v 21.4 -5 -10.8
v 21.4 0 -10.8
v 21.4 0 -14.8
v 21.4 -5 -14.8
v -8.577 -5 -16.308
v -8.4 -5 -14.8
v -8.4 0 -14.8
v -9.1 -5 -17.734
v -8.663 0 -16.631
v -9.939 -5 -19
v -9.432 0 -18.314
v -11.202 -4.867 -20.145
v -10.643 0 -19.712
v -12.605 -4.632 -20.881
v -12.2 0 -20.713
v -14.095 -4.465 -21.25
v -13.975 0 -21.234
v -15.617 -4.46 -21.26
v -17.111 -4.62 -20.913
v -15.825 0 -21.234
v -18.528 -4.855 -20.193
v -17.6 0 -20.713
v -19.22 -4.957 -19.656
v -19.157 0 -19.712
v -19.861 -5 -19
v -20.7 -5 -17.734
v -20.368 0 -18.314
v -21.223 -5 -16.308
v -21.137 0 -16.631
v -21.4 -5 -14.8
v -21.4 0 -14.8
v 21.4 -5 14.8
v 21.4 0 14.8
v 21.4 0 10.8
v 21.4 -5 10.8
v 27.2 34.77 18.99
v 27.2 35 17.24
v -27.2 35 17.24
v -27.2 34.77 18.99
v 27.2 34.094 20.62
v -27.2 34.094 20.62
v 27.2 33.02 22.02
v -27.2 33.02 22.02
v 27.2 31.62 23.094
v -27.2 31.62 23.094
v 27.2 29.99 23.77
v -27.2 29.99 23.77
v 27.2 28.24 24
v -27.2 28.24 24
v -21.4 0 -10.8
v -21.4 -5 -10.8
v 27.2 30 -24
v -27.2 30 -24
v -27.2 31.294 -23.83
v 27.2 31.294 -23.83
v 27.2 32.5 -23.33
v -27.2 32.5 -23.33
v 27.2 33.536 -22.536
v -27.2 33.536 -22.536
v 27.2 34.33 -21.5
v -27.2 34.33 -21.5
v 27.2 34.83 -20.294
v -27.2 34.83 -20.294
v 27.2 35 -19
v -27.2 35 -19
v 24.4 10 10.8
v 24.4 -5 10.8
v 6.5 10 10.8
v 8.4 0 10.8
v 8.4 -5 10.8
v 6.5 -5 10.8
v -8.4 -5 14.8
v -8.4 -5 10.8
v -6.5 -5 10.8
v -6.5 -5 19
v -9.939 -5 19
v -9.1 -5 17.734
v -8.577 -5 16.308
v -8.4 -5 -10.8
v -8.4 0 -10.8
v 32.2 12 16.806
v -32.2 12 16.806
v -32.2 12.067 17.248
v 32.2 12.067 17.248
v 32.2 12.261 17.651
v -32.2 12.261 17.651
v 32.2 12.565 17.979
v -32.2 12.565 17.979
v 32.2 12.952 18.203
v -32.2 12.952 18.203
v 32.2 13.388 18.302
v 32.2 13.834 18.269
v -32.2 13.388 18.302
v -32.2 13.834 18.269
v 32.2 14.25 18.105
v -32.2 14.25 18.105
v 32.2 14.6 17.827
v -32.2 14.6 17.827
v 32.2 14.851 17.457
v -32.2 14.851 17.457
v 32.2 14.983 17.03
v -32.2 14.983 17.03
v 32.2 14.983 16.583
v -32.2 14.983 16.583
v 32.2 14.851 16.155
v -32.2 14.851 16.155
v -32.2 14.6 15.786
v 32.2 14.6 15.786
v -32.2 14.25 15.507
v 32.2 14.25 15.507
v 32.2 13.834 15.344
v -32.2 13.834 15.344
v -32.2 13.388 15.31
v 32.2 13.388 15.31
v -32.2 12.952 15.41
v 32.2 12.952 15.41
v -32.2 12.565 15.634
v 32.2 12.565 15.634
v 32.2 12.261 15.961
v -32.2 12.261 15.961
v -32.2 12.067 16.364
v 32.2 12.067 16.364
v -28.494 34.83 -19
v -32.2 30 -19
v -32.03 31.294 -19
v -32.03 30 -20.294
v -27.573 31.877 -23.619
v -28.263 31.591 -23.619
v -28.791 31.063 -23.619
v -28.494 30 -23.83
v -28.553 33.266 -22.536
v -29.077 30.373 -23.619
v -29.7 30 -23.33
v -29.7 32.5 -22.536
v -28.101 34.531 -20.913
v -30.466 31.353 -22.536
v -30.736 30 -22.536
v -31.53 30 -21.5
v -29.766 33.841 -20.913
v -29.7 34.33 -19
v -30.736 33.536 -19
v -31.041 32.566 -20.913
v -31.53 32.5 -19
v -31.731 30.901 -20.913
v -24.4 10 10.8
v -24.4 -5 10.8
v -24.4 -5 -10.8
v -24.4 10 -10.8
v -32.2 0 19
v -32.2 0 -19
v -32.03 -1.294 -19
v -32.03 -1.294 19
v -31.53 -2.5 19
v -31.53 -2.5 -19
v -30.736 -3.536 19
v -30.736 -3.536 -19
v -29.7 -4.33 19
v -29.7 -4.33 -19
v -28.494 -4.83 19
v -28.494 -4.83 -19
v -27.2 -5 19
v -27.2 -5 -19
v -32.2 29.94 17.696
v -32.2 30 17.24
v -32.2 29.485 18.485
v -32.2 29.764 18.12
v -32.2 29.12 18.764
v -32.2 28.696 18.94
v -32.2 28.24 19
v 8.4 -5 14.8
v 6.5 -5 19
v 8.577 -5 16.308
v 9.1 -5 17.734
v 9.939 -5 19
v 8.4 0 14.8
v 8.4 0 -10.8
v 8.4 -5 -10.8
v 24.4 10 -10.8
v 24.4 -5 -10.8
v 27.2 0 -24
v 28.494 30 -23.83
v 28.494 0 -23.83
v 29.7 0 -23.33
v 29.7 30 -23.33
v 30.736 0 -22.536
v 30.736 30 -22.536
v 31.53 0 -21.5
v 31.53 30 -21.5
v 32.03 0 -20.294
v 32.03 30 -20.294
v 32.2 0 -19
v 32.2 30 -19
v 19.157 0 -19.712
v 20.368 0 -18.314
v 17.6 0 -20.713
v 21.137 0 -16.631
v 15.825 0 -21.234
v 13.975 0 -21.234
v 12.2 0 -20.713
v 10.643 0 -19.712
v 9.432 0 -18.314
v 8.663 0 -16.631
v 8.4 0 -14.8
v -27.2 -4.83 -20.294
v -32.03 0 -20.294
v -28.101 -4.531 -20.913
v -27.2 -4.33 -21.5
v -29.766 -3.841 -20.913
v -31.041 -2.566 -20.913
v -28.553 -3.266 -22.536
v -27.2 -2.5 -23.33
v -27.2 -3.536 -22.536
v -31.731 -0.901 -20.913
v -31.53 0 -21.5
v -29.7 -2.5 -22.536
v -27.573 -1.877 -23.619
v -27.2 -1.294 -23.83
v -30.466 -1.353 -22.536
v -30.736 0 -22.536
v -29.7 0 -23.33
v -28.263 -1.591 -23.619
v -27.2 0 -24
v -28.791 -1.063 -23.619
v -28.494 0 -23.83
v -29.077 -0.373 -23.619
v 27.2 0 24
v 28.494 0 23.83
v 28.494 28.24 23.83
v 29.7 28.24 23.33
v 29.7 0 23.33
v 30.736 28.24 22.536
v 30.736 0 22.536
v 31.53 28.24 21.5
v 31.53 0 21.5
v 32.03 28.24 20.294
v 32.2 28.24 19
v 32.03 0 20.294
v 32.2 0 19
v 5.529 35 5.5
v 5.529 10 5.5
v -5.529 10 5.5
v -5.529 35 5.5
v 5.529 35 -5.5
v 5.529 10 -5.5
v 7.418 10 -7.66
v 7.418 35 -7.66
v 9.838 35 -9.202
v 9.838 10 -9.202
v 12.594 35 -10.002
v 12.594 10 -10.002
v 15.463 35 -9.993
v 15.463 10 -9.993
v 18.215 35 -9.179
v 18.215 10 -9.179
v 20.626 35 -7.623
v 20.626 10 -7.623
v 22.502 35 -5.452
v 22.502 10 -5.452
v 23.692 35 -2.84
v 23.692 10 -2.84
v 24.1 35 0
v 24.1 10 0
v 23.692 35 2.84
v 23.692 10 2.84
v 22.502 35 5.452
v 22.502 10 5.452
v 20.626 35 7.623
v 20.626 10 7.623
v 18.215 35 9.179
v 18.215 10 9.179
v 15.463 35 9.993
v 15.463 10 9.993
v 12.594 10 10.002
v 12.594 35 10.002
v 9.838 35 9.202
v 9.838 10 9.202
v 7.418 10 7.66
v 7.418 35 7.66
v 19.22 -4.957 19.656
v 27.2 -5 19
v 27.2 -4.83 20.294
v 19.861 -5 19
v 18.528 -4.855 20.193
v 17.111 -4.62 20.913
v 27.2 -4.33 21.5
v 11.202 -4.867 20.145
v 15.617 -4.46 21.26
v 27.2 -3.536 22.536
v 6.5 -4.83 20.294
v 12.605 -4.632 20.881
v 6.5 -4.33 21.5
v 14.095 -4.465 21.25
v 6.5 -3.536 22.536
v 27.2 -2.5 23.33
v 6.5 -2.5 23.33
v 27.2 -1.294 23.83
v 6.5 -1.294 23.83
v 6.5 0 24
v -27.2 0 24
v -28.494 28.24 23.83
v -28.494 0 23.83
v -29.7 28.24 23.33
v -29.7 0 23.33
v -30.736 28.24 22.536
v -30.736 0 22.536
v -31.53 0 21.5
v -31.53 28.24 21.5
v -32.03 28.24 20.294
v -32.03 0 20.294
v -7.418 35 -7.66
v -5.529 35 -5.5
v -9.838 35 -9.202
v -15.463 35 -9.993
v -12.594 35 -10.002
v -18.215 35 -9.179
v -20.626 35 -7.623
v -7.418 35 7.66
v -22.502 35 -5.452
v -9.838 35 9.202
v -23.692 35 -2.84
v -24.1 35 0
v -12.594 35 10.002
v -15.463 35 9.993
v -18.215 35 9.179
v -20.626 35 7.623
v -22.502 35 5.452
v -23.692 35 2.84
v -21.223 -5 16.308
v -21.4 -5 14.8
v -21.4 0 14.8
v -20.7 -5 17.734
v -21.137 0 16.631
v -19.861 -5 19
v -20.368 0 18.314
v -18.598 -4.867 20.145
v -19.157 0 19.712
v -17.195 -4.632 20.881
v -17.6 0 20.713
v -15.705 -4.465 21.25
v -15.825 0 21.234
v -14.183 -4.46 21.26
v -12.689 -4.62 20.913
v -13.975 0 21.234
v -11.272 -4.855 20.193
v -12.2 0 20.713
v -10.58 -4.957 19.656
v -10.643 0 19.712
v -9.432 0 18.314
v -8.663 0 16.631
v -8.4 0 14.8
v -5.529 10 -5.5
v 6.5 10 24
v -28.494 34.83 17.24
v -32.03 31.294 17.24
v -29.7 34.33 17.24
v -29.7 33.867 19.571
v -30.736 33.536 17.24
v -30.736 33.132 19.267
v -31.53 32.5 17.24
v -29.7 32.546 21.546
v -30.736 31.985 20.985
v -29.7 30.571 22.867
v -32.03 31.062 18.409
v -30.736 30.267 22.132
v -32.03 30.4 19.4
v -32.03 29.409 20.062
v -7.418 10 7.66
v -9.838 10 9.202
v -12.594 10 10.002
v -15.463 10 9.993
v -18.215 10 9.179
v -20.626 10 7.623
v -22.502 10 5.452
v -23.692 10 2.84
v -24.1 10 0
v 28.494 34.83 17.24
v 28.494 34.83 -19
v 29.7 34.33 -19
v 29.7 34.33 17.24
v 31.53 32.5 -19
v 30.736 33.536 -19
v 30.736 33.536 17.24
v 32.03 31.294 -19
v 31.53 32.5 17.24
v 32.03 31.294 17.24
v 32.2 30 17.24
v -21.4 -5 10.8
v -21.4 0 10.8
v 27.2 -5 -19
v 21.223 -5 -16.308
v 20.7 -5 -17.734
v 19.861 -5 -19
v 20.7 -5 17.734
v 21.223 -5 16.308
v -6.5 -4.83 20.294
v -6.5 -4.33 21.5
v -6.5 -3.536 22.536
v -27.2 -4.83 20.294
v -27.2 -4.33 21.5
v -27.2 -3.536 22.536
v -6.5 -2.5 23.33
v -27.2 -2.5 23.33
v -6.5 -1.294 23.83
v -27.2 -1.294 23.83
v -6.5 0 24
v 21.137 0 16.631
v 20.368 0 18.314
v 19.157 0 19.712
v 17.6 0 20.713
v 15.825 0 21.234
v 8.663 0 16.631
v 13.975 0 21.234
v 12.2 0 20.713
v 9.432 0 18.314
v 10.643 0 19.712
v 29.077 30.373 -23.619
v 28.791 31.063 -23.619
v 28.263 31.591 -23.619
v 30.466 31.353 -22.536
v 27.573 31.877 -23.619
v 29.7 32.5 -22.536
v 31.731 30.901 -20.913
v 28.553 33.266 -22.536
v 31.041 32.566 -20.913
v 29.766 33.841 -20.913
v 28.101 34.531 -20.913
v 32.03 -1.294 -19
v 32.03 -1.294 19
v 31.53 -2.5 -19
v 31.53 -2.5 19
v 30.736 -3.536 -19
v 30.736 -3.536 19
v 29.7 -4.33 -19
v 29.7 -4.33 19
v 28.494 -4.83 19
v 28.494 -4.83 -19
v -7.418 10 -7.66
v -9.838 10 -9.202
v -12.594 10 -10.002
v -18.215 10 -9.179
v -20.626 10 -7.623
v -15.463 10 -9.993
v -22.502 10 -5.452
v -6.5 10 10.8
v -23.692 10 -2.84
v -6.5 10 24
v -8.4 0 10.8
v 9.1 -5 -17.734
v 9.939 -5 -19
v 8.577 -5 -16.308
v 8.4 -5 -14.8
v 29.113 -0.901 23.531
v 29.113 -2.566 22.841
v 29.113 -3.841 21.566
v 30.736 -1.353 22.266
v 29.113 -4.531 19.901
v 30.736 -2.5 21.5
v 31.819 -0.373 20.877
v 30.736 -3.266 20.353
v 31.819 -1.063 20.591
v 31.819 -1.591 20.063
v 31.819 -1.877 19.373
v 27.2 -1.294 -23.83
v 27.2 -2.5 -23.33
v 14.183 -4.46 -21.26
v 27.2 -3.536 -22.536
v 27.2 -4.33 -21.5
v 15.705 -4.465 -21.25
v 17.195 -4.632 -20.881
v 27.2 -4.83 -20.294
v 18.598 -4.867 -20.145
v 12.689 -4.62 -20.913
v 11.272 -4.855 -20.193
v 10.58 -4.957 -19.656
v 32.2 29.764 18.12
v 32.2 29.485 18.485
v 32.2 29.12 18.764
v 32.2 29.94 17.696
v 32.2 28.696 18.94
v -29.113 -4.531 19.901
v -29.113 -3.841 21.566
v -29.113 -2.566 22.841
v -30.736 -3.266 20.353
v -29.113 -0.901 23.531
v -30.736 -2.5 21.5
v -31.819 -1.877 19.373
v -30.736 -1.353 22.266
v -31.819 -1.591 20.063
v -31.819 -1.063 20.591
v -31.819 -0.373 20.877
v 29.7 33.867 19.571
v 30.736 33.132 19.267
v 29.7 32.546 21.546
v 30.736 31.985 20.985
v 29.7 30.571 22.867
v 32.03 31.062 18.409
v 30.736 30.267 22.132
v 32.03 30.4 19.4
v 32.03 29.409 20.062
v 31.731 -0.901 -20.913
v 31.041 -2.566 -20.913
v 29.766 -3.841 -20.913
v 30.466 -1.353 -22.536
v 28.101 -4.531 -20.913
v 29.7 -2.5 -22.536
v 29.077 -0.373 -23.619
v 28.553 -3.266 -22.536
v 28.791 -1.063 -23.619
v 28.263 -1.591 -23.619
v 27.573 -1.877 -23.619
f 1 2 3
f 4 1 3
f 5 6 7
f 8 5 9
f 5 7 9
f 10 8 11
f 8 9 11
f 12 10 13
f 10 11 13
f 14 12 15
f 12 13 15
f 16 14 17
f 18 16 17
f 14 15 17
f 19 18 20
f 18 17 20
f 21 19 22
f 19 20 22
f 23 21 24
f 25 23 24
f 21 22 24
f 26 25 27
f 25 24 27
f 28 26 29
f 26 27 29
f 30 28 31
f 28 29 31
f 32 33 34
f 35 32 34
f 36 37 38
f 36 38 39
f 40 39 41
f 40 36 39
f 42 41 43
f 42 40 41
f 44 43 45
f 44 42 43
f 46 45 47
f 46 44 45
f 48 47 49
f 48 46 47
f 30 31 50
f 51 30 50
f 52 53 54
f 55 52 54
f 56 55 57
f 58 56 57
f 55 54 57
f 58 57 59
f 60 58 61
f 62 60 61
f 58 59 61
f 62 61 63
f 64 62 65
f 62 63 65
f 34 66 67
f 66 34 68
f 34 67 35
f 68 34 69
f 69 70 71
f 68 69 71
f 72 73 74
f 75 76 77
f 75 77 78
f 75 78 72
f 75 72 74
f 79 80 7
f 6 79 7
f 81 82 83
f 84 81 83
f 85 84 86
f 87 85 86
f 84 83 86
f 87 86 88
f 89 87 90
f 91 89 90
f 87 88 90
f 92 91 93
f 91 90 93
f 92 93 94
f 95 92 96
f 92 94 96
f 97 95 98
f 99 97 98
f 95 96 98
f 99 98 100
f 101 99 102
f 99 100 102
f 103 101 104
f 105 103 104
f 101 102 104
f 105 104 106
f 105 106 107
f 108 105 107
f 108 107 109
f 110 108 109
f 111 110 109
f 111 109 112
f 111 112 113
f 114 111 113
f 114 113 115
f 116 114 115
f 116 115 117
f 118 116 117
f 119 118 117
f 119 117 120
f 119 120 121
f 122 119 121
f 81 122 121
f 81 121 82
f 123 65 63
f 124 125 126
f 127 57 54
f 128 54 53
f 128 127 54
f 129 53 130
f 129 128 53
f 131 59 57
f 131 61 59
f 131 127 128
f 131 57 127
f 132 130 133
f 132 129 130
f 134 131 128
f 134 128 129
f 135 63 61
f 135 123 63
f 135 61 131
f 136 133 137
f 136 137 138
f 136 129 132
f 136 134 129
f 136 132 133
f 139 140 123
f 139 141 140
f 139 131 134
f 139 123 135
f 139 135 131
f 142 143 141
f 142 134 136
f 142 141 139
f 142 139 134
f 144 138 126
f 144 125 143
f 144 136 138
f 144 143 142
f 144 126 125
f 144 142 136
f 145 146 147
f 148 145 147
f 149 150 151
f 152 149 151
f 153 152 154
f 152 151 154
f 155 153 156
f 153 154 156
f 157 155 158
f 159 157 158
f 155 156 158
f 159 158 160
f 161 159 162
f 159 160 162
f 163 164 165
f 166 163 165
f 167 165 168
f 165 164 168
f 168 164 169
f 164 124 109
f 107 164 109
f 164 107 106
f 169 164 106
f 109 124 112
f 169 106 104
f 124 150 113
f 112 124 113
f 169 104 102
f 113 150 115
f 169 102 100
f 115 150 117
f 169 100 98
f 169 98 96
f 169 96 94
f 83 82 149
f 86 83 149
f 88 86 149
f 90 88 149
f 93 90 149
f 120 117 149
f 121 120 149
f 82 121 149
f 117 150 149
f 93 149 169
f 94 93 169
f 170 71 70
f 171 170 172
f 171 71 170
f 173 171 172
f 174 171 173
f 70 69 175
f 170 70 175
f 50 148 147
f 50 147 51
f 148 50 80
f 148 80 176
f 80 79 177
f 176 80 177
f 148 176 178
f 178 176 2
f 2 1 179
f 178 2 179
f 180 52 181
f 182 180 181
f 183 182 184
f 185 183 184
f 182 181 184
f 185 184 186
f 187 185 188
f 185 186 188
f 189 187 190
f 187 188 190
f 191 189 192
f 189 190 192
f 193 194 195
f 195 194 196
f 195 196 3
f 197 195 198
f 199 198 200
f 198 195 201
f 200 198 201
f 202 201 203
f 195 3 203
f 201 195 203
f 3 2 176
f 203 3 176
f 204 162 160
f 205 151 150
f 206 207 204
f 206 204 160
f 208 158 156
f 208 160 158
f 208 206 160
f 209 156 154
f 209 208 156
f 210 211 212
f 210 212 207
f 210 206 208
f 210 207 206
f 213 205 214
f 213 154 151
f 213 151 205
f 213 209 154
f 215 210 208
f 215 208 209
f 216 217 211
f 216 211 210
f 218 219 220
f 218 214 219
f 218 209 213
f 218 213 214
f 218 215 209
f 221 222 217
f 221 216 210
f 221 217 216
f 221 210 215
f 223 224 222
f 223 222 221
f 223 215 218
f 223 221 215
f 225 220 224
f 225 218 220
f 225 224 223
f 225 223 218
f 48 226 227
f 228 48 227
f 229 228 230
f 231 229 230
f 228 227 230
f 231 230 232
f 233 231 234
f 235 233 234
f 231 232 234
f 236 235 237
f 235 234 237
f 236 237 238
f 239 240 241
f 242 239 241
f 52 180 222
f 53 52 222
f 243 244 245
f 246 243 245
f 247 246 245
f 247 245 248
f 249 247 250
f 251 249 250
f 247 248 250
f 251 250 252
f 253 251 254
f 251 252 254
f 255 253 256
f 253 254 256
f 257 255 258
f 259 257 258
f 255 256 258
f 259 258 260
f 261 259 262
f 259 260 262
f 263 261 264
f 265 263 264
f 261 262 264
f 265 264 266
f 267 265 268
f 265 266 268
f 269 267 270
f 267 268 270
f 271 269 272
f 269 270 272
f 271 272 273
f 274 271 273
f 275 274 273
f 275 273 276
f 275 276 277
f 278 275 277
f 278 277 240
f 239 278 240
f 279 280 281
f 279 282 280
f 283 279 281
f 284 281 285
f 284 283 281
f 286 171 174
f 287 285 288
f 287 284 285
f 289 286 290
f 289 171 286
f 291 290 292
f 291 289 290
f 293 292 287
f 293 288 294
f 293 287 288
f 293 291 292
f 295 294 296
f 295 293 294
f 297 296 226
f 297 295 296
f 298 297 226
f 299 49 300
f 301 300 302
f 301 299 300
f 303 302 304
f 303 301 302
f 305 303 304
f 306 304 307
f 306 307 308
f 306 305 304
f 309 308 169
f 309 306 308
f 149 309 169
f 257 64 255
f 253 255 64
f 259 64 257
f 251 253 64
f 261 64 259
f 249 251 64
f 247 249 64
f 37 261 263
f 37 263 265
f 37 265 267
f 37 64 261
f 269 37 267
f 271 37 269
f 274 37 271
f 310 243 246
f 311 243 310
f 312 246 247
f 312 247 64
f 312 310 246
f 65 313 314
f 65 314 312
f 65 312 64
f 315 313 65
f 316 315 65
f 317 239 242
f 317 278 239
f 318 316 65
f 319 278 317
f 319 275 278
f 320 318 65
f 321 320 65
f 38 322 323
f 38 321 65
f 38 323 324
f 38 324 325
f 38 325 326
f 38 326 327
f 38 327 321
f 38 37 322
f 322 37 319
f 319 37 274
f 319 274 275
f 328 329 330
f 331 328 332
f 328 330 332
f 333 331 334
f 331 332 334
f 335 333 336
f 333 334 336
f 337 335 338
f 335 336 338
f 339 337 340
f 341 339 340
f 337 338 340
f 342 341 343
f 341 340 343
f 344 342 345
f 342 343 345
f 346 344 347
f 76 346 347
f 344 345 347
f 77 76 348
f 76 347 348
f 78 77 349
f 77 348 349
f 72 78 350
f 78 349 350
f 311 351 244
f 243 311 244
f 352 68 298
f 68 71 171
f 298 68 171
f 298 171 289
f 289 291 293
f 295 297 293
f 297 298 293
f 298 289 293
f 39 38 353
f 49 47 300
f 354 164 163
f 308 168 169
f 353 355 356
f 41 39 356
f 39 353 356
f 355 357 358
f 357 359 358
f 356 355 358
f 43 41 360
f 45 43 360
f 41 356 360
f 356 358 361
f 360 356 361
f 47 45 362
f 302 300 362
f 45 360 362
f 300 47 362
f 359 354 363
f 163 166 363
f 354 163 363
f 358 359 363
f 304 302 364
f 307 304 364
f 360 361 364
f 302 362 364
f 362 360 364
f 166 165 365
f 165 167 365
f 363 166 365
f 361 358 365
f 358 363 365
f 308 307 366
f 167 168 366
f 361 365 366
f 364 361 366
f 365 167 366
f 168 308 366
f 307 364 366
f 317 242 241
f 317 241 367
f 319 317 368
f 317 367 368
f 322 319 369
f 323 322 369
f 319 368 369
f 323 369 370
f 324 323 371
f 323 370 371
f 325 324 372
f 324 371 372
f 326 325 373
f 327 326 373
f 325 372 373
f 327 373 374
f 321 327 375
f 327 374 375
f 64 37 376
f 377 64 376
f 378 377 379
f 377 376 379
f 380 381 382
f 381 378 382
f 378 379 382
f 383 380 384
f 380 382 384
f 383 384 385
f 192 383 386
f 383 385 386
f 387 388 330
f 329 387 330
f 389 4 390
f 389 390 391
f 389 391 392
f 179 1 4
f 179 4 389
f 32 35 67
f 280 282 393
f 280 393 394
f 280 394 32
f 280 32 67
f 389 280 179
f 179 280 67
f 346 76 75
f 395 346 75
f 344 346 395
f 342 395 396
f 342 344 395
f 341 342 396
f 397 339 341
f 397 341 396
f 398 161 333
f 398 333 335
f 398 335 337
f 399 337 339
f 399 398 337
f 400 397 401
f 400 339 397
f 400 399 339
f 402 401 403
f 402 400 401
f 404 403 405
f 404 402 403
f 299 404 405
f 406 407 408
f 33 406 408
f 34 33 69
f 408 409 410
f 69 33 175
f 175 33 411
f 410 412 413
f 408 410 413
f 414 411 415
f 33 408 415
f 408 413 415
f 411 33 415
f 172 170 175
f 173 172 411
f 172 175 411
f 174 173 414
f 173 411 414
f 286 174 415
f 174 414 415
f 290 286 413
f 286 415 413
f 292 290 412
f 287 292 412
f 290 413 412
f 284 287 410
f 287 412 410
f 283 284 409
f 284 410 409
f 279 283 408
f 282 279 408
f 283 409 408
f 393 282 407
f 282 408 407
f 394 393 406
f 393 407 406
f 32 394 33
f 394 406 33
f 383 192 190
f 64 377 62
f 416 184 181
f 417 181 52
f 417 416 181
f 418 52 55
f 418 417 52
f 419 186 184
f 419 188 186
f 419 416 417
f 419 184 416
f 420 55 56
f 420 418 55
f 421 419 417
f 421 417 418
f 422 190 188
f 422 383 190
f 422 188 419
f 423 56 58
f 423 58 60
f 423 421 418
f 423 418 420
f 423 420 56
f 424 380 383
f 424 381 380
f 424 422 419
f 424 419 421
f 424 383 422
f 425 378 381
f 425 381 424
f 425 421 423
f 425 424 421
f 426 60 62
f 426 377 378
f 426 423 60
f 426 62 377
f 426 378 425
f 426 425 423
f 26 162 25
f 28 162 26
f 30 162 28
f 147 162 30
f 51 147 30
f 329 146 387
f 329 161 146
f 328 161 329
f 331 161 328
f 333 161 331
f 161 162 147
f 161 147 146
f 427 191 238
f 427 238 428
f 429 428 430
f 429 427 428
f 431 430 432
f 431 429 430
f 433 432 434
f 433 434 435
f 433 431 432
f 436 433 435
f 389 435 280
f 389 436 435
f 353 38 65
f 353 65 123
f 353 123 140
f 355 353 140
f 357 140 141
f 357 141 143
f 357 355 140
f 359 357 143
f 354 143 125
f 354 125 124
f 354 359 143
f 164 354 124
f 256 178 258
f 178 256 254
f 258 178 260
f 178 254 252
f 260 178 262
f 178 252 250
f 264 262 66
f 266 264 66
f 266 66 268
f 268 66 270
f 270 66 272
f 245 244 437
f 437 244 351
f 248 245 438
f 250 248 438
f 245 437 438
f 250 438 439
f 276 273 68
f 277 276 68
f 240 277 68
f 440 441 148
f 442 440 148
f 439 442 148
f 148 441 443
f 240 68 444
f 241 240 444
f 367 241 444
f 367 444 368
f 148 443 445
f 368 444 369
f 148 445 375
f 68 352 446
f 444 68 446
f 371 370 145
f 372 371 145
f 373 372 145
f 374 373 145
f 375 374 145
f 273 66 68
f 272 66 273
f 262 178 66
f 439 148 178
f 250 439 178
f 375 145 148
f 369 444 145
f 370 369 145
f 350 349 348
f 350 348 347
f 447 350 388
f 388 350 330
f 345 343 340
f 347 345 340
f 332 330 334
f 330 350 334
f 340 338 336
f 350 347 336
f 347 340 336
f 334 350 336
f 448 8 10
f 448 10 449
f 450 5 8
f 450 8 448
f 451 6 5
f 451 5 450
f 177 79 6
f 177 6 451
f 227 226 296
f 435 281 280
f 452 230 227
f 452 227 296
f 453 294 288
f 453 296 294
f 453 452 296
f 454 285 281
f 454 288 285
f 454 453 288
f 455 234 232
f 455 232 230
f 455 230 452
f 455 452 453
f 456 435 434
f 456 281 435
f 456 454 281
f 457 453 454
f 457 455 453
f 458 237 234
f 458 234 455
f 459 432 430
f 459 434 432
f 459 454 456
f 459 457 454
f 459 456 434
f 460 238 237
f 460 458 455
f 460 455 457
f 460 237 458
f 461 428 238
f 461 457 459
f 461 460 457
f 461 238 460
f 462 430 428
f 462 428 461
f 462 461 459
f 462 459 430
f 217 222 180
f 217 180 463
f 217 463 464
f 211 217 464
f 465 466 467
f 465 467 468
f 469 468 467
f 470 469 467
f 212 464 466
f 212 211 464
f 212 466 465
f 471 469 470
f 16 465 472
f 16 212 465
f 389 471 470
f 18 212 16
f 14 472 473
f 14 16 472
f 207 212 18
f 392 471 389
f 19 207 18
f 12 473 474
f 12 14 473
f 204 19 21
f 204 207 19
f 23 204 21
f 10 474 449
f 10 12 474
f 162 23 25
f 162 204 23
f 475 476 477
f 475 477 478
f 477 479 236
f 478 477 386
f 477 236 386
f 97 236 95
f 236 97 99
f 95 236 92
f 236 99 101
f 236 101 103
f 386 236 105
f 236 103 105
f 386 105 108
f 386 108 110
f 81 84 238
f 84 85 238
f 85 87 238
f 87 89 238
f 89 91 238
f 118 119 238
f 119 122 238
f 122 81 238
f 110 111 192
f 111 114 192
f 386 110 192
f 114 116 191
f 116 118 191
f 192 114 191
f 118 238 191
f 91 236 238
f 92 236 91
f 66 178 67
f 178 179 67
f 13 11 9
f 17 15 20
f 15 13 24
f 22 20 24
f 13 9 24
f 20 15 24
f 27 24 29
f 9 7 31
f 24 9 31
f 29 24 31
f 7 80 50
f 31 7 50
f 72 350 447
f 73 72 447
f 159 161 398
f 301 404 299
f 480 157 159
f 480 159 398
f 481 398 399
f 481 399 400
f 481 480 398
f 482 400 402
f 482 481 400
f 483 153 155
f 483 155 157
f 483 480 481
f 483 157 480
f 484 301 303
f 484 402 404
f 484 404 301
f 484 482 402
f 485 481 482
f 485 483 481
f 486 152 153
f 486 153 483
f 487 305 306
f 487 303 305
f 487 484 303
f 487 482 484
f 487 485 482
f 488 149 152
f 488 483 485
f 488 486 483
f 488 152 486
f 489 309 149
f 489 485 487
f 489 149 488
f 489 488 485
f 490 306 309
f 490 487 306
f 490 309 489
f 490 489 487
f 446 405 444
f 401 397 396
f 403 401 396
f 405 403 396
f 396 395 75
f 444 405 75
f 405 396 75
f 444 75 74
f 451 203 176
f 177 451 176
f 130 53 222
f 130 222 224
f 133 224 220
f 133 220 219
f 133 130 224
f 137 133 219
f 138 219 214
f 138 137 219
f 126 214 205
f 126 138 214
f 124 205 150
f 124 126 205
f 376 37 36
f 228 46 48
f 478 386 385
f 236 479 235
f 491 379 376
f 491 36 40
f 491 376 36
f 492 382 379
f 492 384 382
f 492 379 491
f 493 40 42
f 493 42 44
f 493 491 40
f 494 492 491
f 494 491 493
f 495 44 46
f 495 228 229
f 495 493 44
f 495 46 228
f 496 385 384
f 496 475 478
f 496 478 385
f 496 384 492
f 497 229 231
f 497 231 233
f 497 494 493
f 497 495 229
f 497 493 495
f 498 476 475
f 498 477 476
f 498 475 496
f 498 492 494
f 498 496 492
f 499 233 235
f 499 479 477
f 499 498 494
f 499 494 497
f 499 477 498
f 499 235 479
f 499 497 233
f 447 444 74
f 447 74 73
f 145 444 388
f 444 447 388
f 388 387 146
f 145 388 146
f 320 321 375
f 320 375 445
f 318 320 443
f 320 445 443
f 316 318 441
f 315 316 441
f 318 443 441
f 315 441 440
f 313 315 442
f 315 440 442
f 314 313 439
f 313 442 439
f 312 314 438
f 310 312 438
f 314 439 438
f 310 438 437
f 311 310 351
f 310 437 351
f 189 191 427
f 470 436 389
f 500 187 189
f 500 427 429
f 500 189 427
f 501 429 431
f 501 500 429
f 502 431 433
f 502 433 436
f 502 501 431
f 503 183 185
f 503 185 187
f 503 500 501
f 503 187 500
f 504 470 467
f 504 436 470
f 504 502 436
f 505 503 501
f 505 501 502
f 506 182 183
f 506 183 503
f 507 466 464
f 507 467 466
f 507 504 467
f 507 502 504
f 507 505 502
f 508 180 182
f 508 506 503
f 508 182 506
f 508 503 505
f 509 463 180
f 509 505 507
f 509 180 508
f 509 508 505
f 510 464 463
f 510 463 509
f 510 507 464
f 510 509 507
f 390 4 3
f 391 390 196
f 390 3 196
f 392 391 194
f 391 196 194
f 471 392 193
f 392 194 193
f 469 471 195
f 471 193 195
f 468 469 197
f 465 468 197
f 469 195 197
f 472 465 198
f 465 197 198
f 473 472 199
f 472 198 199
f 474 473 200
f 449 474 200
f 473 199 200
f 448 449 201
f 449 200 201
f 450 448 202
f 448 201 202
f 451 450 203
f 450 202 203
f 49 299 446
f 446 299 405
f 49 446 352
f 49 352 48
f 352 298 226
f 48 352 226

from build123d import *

# Parameters (mm, degrees)
F1_DEPTH      = 5
F3_DEPTH      = 10
F5_DEPTH      = 25
F6_R          = 1.5
F7_DEPTH      = 69.4
F8_R          = 6.7597979746
F9_R          = 5
F10_R         = 5
F11_T1_DEPTH  = 45.7
F11_T3_DEPTH  = 45.7
F12_T1_DEPTH  = 54.4
F12_T3_DEPTH  = 30
F12_T5_DEPTH  = 38
F12_S9_W      = 5
F12_S9_H      = 5
F12_T10_DEPTH = 5
F12_S15_W     = 5
F12_S15_H     = 5
F12_T16_DEPTH = 5
F12_S21_W     = 5
F12_S21_H     = 5
F12_T22_DEPTH = 5
F12_S27_W     = 5
F12_S27_H     = 5
F12_T28_DEPTH = 5
F12_T32_ANGLE = 90
F12_T34_ANGLE = 90


# Not quite as in the source:
# - a fillet or chamfer that OpenCascade refuses, or shapes differently, is made with other operations: its cross-section is extruded or revolved along the edge and cut away or added


with BuildPart() as f1:
    # F0 (on Front) → F1 (new body)
    with BuildSketch(Plane.XZ):
        with BuildLine():
            Line((32.2, -24), (32.2, 24))
            Line((32.2, 24), (6.5, 24))
            Line((6.5, 24), (6.5, 10.8))
            Line((6.5, 10.8), (8.4, 10.8))
            Line((8.4, 10.8), (8.4, 14.8))
            ThreePointArc((8.4, 14.8), (14.9, 21.3), (21.4, 14.8))
            Line((21.4, 14.8), (21.4, 10.8))
            Line((21.4, 10.8), (24.4, 10.8))
            Line((24.4, 10.8), (24.4, -10.8))
            Line((24.4, -10.8), (21.4, -10.8))
            Line((21.4, -10.8), (21.4, -14.8))
            ThreePointArc((21.4, -14.8), (14.9, -21.3), (8.4, -14.8))
            Line((8.4, -14.8), (8.4, -10.8))
            Line((8.4, -10.8), (-8.4, -10.8))
            Line((-8.4, -10.8), (-8.4, -14.8))
            ThreePointArc((-8.4, -14.8), (-14.9, -21.3), (-21.4, -14.8))
            Line((-21.4, -14.8), (-21.4, -10.8))
            Line((-21.4, -10.8), (-24.4, -10.8))
            Line((-24.4, -10.8), (-24.4, 10.8))
            Line((-24.4, 10.8), (-21.4, 10.8))
            Line((-21.4, 10.8), (-21.4, 14.8))
            ThreePointArc((-21.4, 14.8), (-14.9, 21.3), (-8.4, 14.8))
            Line((-8.4, 14.8), (-8.4, 10.8))
            Line((-8.4, 10.8), (-6.5, 10.8))
            Line((-6.5, 10.8), (-6.5, 24))
            Line((-6.5, 24), (-32.2, 24))
            Line((-32.2, 24), (-32.2, -24))
            Line((-32.2, -24), (32.2, -24))
        make_face()
    extrude(amount=F1_DEPTH)

    # F2 (on face) → F3 (join)
    with BuildSketch(Plane(origin=(0, 0, 0), x_dir=(-1, 0, 0), z_dir=(0, 1, 0))):
        with BuildLine():
            Line((24.4, 10.8), (24.4, -10.8))
            Line((24.4, -10.8), (21.4, -10.8))
            Line((21.4, -10.8), (21.4, -14.8))
            ThreePointArc((21.4, -14.8), (14.9, -21.3), (8.4, -14.8))
            Line((8.4, -14.8), (8.4, -10.8))
            Line((8.4, -10.8), (-8.4, -10.8))
            Line((-8.4, -10.8), (-8.4, -14.8))
            ThreePointArc((-8.4, -14.8), (-14.9, -21.3), (-21.4, -14.8))
            Line((-21.4, -14.8), (-21.4, -10.8))
            Line((-21.4, -10.8), (-24.4, -10.8))
            Line((-24.4, -10.8), (-24.4, 10.8))
            Line((-24.4, 10.8), (-21.4, 10.8))
            Line((-21.4, 10.8), (-21.4, 14.8))
            ThreePointArc((-21.4, 14.8), (-14.9, 21.3), (-8.4, 14.8))
            Line((-8.4, 14.8), (-8.4, 10.8))
            Line((-8.4, 10.8), (-6.5, 10.8))
            Line((-6.5, 10.8), (-6.5, 24))
            Line((-6.5, 24), (-32.2, 24))
            Line((-32.2, 24), (-32.2, -24))
            Line((-32.2, -24), (32.2, -24))
            Line((32.2, -24), (32.2, 24))
            Line((32.2, 24), (6.5, 24))
            Line((6.5, 24), (6.5, 10.8))
            Line((6.5, 10.8), (8.4, 10.8))
            Line((8.4, 10.8), (8.4, 14.8))
            ThreePointArc((8.4, 14.8), (14.9, 21.3), (21.4, 14.8))
            Line((21.4, 14.8), (21.4, 10.8))
            Line((21.4, 10.8), (24.4, 10.8))
        make_face()
        with BuildLine():
            Line((21.4, -14.8), (21.4, -10.8))
            Line((21.4, -10.8), (8.4, -10.8))
            Line((8.4, -10.8), (8.4, -14.8))
            ThreePointArc((8.4, -14.8), (14.9, -21.3), (21.4, -14.8))
        make_face()
        with BuildLine():
            Line((-8.4, -14.8), (-8.4, -10.8))
            Line((-8.4, -10.8), (-21.4, -10.8))
            Line((-21.4, -10.8), (-21.4, -14.8))
            ThreePointArc((-21.4, -14.8), (-14.9, -21.3), (-8.4, -14.8))
        make_face()
        with BuildLine():
            Line((8.4, 10.8), (21.4, 10.8))
            Line((21.4, 10.8), (21.4, 14.8))
            ThreePointArc((21.4, 14.8), (14.9, 21.3), (8.4, 14.8))
            Line((8.4, 14.8), (8.4, 10.8))
        make_face()
        with BuildLine():
            Line((-21.4, 10.8), (-8.4, 10.8))
            Line((-8.4, 10.8), (-8.4, 14.8))
            ThreePointArc((-8.4, 14.8), (-14.9, 21.3), (-21.4, 14.8))
            Line((-21.4, 14.8), (-21.4, 10.8))
        make_face()
    extrude(amount=F3_DEPTH)

    # F4 (on face) → F5 (join)
    with BuildSketch(Plane(origin=(0, 10, 0), x_dir=(-1, 0, 0), z_dir=(0, 1, 0))):
        Polygon((32.2, -24), (32.2, 24), (6.5, 24), (6.5, 10.8), (24.4, 10.8), (24.4, -10.8), (-24.4, -10.8), (-24.4, 10.8), (-6.5, 10.8), (-6.5, 24), (-32.2, 24), (-32.2, -24), align=None)
        Polygon((6.5, 10.8), (6.5, 24), (-6.5, 24), (-6.5, 10.8), (-24.4, 10.8), (-24.4, -10.8), (24.4, -10.8), (24.4, 10.8), align=None)
        with BuildLine():
            ThreePointArc((5.5288725662, 5.5), (16.8680666762, 9.6842239514), (24.1, 0))
            ThreePointArc((24.1, 0), (16.8680666762, -9.6842239514), (5.5288725662, -5.5))
            Line((5.5288725662, -5.5), (0, -5.5))
            Line((0, -5.5), (-5.5288725662, -5.5))
            ThreePointArc((-5.5288725662, -5.5), (-24.1, 0), (-5.5288725662, 5.5))
            Line((-5.5288725662, 5.5), (0, 5.5))
            Line((0, 5.5), (5.5288725662, 5.5))
        make_face(mode=Mode.SUBTRACT)
    extrude(amount=F5_DEPTH)

    # F6 (on face) → F7 (cut)
    with BuildSketch(Plane(origin=(-32.2, 0, 0), x_dir=(0, -1, 0), z_dir=(-1, 0, 0))):
        with Locations((-13.5, 16.806252715)):
            Circle(F6_R)
    extrude(amount=-F7_DEPTH, mode=Mode.SUBTRACT)

    # F8
    f8_edges = [f1.edges().sort_by_distance(p)[0] for p in [
        (0, 35, 24),
    ]]
    fillet(f8_edges, radius=F8_R)

    # F9
    f9_edges = [f1.edges().sort_by_distance(p)[0] for p in [
        (32.2, 33.020101, 22.020101),
        (32.2, 35, -3.379899),
    ]]
    fillet(f9_edges, radius=F9_R)

    # F10
    f10_edges = [f1.edges().sort_by_distance(p)[0] for p in [
        (-32.2, 35, -3.379899),
    ]]
    fillet(f10_edges, radius=F10_R)

    # F11: fillet of radius 5 on 2 edges, made by hand

    # F11_s2 → F11_t1 (cut)
    with BuildSketch(Plane.YZ.offset(-39.7)):
        with BuildLine():
            ThreePointArc((-5, 19), (-3.5355339059, 22.5355339059), (0, 24))
            Line((0, 24), (-5, 24))
            Line((-5, 24), (-5, 19))
        make_face()
    extrude(amount=F11_T1_DEPTH, mode=Mode.SUBTRACT)

    # F11_s4 → F11_t3 (cut)
    with BuildSketch(Plane.YZ.offset(-6)):
        with BuildLine():
            ThreePointArc((-5, 19), (-3.5355339059, 22.5355339059), (0, 24))
            Line((0, 24), (-5, 24))
            Line((-5, 24), (-5, 19))
        make_face()
    extrude(amount=F11_T3_DEPTH, mode=Mode.SUBTRACT)

    # F12: fillet of radius 5 on 8 edges, made by hand

    # F12_s2 → F12_t1 (cut)
    with BuildSketch(Plane.YZ.offset(-27.2)):
        with BuildLine():
            ThreePointArc((30, -24), (33.5355339059, -22.5355339059), (35, -19))
            Line((35, -19), (35, -24))
            Line((35, -24), (30, -24))
        make_face()
        with BuildLine():
            ThreePointArc((0, -24), (-3.5355339059, -22.5355339059), (-5, -19))
            Line((-5, -19), (-5, -24))
            Line((-5, -24), (0, -24))
        make_face()
    extrude(amount=F12_T1_DEPTH, mode=Mode.SUBTRACT)

    # F12_s4 → F12_t3 (cut)
    with BuildSketch(Plane.XZ.offset(-30)):
        with BuildLine():
            ThreePointArc((-27.2, -24), (-30.7355339059, -22.5355339059), (-32.2, -19))
            Line((-32.2, -19), (-32.2, -24))
            Line((-32.2, -24), (-27.2, -24))
        make_face()
        with BuildLine():
            ThreePointArc((27.2, -24), (30.7355339059, -22.5355339059), (32.2, -19))
            Line((32.2, -19), (32.2, -24))
            Line((32.2, -24), (27.2, -24))
        make_face()
    extrude(amount=F12_T3_DEPTH, mode=Mode.SUBTRACT)

    # F12_s6 → F12_t5 (cut)
    with BuildSketch(Plane.XY.offset(-19)):
        with BuildLine():
            ThreePointArc((-32.2, 0), (-30.7355339059, -3.5355339059), (-27.2, -5))
            Line((-27.2, -5), (-32.2, -5))
            Line((-32.2, -5), (-32.2, 0))
        make_face()
        with BuildLine():
            ThreePointArc((32.2, 0), (30.7355339059, -3.5355339059), (27.2, -5))
            Line((27.2, -5), (32.2, -5))
            Line((32.2, -5), (32.2, 0))
        make_face()
    extrude(amount=F12_T5_DEPTH, mode=Mode.SUBTRACT)


with BuildPart() as f12_tool8:
    # F12_s9 → F12_t10 (new body)
    with BuildSketch(Plane.YZ.offset(27.2)):
        with Locations((-2.5, 21.5)):
            Rectangle(F12_S9_W, F12_S9_H)
    extrude(amount=F12_T10_DEPTH)

    # F12_s11 → F12_t12 (revolve, cut)
    with BuildSketch(Plane(origin=(27.2, 0, 19), x_dir=(0, 0.7071067812, -0.7071067812), z_dir=(0, -0.7071067812, -0.7071067812))):
        with BuildLine():
            ThreePointArc((0, -5), (5, 0), (0, 5))
            Line((0, 5), (0, -5))
        make_face()
    revolve(axis=Axis((27.2, 0, 19), (1, 0, 0)), mode=Mode.SUBTRACT)


with BuildPart() as f1_1:
    add(f1.part)

    # F12_t7: cut F12_tool8
    add(f12_tool8.part, mode=Mode.SUBTRACT)


with BuildPart() as f12_tool14:
    # F12_s15 → F12_t16 (new body)
    with BuildSketch(Plane.YZ.offset(-27.2)):
        with Locations((-2.5, 21.5)):
            Rectangle(F12_S15_W, F12_S15_H)
    extrude(amount=-F12_T16_DEPTH)

    # F12_s17 → F12_t18 (revolve, cut)
    with BuildSketch(Plane(origin=(-27.2, 0, 19), x_dir=(0, 0.7071067812, -0.7071067812), z_dir=(0, 0.7071067812, 0.7071067812))):
        with BuildLine():
            ThreePointArc((0, -5), (5, 0), (0, 5))
            Line((0, 5), (0, -5))
        make_face()
    revolve(axis=Axis((-27.2, 0, 19), (-1, 0, 0)), mode=Mode.SUBTRACT)


with BuildPart() as f1_2:
    add(f1_1.part)

    # F12_t13: cut F12_tool14
    add(f12_tool14.part, mode=Mode.SUBTRACT)


with BuildPart() as f12_tool20:
    # F12_s21 → F12_t22 (new body)
    with BuildSketch(Plane.XY.offset(-19)):
        with Locations((-29.7, -2.5)):
            Rectangle(F12_S21_W, F12_S21_H)
    extrude(amount=-F12_T22_DEPTH)

    # F12_s23 → F12_t24 (revolve, cut)
    with BuildSketch(Plane(origin=(-27.2, 0, -19), x_dir=(0.7071067812, 0.7071067812, 0), z_dir=(-0.7071067812, 0.7071067812, 0))):
        with BuildLine():
            ThreePointArc((0, -5), (5, 0), (0, 5))
            Line((0, 5), (0, -5))
        make_face()
    revolve(axis=Axis((-27.2, 0, -19), (0, 0, -1)), mode=Mode.SUBTRACT)


with BuildPart() as f1_3:
    add(f1_2.part)

    # F12_t19: cut F12_tool20
    add(f12_tool20.part, mode=Mode.SUBTRACT)


with BuildPart() as f12_tool26:
    # F12_s27 → F12_t28 (new body)
    with BuildSketch(Plane.XY.offset(-19)):
        with Locations((29.7, -2.5)):
            Rectangle(F12_S27_W, F12_S27_H)
    extrude(amount=-F12_T28_DEPTH)

    # F12_s29 → F12_t30 (revolve, cut)
    with BuildSketch(Plane(origin=(27.2, 0, -19), x_dir=(-0.7071067812, 0.7071067812, 0), z_dir=(-0.7071067812, -0.7071067812, 0))):
        with BuildLine():
            ThreePointArc((0, -5), (5, 0), (0, 5))
            Line((0, 5), (0, -5))
        make_face()
    revolve(axis=Axis((27.2, 0, -19), (0, 0, -1)), mode=Mode.SUBTRACT)


with BuildPart() as f1_4:
    add(f1_3.part)

    # F12_t25: cut F12_tool26
    add(f12_tool26.part, mode=Mode.SUBTRACT)

    # F12_s31 → F12_t32 (revolve, cut)
    with BuildSketch(Plane.YZ.offset(-27.2)):
        with BuildLine():
            ThreePointArc((30, -24), (33.5355339059, -22.5355339059), (35, -19))
            Line((35, -19), (35, -24))
            Line((35, -24), (30, -24))
        make_face()
    revolve(axis=Axis((-27.2, 30, -24), (0, 0, 1)), revolution_arc=F12_T32_ANGLE, mode=Mode.SUBTRACT)

    # F12_s33 → F12_t34 (revolve, cut)
    with BuildSketch(Plane.XZ.offset(-30)):
        with BuildLine():
            ThreePointArc((27.2, -24), (30.7355339059, -22.5355339059), (32.2, -19))
            Line((32.2, -19), (32.2, -24))
            Line((32.2, -24), (27.2, -24))
        make_face()
    revolve(axis=Axis((27.2, 30, -24), (0, 0, 1)), revolution_arc=F12_T34_ANGLE, mode=Mode.SUBTRACT)


solid = f1_4.part
